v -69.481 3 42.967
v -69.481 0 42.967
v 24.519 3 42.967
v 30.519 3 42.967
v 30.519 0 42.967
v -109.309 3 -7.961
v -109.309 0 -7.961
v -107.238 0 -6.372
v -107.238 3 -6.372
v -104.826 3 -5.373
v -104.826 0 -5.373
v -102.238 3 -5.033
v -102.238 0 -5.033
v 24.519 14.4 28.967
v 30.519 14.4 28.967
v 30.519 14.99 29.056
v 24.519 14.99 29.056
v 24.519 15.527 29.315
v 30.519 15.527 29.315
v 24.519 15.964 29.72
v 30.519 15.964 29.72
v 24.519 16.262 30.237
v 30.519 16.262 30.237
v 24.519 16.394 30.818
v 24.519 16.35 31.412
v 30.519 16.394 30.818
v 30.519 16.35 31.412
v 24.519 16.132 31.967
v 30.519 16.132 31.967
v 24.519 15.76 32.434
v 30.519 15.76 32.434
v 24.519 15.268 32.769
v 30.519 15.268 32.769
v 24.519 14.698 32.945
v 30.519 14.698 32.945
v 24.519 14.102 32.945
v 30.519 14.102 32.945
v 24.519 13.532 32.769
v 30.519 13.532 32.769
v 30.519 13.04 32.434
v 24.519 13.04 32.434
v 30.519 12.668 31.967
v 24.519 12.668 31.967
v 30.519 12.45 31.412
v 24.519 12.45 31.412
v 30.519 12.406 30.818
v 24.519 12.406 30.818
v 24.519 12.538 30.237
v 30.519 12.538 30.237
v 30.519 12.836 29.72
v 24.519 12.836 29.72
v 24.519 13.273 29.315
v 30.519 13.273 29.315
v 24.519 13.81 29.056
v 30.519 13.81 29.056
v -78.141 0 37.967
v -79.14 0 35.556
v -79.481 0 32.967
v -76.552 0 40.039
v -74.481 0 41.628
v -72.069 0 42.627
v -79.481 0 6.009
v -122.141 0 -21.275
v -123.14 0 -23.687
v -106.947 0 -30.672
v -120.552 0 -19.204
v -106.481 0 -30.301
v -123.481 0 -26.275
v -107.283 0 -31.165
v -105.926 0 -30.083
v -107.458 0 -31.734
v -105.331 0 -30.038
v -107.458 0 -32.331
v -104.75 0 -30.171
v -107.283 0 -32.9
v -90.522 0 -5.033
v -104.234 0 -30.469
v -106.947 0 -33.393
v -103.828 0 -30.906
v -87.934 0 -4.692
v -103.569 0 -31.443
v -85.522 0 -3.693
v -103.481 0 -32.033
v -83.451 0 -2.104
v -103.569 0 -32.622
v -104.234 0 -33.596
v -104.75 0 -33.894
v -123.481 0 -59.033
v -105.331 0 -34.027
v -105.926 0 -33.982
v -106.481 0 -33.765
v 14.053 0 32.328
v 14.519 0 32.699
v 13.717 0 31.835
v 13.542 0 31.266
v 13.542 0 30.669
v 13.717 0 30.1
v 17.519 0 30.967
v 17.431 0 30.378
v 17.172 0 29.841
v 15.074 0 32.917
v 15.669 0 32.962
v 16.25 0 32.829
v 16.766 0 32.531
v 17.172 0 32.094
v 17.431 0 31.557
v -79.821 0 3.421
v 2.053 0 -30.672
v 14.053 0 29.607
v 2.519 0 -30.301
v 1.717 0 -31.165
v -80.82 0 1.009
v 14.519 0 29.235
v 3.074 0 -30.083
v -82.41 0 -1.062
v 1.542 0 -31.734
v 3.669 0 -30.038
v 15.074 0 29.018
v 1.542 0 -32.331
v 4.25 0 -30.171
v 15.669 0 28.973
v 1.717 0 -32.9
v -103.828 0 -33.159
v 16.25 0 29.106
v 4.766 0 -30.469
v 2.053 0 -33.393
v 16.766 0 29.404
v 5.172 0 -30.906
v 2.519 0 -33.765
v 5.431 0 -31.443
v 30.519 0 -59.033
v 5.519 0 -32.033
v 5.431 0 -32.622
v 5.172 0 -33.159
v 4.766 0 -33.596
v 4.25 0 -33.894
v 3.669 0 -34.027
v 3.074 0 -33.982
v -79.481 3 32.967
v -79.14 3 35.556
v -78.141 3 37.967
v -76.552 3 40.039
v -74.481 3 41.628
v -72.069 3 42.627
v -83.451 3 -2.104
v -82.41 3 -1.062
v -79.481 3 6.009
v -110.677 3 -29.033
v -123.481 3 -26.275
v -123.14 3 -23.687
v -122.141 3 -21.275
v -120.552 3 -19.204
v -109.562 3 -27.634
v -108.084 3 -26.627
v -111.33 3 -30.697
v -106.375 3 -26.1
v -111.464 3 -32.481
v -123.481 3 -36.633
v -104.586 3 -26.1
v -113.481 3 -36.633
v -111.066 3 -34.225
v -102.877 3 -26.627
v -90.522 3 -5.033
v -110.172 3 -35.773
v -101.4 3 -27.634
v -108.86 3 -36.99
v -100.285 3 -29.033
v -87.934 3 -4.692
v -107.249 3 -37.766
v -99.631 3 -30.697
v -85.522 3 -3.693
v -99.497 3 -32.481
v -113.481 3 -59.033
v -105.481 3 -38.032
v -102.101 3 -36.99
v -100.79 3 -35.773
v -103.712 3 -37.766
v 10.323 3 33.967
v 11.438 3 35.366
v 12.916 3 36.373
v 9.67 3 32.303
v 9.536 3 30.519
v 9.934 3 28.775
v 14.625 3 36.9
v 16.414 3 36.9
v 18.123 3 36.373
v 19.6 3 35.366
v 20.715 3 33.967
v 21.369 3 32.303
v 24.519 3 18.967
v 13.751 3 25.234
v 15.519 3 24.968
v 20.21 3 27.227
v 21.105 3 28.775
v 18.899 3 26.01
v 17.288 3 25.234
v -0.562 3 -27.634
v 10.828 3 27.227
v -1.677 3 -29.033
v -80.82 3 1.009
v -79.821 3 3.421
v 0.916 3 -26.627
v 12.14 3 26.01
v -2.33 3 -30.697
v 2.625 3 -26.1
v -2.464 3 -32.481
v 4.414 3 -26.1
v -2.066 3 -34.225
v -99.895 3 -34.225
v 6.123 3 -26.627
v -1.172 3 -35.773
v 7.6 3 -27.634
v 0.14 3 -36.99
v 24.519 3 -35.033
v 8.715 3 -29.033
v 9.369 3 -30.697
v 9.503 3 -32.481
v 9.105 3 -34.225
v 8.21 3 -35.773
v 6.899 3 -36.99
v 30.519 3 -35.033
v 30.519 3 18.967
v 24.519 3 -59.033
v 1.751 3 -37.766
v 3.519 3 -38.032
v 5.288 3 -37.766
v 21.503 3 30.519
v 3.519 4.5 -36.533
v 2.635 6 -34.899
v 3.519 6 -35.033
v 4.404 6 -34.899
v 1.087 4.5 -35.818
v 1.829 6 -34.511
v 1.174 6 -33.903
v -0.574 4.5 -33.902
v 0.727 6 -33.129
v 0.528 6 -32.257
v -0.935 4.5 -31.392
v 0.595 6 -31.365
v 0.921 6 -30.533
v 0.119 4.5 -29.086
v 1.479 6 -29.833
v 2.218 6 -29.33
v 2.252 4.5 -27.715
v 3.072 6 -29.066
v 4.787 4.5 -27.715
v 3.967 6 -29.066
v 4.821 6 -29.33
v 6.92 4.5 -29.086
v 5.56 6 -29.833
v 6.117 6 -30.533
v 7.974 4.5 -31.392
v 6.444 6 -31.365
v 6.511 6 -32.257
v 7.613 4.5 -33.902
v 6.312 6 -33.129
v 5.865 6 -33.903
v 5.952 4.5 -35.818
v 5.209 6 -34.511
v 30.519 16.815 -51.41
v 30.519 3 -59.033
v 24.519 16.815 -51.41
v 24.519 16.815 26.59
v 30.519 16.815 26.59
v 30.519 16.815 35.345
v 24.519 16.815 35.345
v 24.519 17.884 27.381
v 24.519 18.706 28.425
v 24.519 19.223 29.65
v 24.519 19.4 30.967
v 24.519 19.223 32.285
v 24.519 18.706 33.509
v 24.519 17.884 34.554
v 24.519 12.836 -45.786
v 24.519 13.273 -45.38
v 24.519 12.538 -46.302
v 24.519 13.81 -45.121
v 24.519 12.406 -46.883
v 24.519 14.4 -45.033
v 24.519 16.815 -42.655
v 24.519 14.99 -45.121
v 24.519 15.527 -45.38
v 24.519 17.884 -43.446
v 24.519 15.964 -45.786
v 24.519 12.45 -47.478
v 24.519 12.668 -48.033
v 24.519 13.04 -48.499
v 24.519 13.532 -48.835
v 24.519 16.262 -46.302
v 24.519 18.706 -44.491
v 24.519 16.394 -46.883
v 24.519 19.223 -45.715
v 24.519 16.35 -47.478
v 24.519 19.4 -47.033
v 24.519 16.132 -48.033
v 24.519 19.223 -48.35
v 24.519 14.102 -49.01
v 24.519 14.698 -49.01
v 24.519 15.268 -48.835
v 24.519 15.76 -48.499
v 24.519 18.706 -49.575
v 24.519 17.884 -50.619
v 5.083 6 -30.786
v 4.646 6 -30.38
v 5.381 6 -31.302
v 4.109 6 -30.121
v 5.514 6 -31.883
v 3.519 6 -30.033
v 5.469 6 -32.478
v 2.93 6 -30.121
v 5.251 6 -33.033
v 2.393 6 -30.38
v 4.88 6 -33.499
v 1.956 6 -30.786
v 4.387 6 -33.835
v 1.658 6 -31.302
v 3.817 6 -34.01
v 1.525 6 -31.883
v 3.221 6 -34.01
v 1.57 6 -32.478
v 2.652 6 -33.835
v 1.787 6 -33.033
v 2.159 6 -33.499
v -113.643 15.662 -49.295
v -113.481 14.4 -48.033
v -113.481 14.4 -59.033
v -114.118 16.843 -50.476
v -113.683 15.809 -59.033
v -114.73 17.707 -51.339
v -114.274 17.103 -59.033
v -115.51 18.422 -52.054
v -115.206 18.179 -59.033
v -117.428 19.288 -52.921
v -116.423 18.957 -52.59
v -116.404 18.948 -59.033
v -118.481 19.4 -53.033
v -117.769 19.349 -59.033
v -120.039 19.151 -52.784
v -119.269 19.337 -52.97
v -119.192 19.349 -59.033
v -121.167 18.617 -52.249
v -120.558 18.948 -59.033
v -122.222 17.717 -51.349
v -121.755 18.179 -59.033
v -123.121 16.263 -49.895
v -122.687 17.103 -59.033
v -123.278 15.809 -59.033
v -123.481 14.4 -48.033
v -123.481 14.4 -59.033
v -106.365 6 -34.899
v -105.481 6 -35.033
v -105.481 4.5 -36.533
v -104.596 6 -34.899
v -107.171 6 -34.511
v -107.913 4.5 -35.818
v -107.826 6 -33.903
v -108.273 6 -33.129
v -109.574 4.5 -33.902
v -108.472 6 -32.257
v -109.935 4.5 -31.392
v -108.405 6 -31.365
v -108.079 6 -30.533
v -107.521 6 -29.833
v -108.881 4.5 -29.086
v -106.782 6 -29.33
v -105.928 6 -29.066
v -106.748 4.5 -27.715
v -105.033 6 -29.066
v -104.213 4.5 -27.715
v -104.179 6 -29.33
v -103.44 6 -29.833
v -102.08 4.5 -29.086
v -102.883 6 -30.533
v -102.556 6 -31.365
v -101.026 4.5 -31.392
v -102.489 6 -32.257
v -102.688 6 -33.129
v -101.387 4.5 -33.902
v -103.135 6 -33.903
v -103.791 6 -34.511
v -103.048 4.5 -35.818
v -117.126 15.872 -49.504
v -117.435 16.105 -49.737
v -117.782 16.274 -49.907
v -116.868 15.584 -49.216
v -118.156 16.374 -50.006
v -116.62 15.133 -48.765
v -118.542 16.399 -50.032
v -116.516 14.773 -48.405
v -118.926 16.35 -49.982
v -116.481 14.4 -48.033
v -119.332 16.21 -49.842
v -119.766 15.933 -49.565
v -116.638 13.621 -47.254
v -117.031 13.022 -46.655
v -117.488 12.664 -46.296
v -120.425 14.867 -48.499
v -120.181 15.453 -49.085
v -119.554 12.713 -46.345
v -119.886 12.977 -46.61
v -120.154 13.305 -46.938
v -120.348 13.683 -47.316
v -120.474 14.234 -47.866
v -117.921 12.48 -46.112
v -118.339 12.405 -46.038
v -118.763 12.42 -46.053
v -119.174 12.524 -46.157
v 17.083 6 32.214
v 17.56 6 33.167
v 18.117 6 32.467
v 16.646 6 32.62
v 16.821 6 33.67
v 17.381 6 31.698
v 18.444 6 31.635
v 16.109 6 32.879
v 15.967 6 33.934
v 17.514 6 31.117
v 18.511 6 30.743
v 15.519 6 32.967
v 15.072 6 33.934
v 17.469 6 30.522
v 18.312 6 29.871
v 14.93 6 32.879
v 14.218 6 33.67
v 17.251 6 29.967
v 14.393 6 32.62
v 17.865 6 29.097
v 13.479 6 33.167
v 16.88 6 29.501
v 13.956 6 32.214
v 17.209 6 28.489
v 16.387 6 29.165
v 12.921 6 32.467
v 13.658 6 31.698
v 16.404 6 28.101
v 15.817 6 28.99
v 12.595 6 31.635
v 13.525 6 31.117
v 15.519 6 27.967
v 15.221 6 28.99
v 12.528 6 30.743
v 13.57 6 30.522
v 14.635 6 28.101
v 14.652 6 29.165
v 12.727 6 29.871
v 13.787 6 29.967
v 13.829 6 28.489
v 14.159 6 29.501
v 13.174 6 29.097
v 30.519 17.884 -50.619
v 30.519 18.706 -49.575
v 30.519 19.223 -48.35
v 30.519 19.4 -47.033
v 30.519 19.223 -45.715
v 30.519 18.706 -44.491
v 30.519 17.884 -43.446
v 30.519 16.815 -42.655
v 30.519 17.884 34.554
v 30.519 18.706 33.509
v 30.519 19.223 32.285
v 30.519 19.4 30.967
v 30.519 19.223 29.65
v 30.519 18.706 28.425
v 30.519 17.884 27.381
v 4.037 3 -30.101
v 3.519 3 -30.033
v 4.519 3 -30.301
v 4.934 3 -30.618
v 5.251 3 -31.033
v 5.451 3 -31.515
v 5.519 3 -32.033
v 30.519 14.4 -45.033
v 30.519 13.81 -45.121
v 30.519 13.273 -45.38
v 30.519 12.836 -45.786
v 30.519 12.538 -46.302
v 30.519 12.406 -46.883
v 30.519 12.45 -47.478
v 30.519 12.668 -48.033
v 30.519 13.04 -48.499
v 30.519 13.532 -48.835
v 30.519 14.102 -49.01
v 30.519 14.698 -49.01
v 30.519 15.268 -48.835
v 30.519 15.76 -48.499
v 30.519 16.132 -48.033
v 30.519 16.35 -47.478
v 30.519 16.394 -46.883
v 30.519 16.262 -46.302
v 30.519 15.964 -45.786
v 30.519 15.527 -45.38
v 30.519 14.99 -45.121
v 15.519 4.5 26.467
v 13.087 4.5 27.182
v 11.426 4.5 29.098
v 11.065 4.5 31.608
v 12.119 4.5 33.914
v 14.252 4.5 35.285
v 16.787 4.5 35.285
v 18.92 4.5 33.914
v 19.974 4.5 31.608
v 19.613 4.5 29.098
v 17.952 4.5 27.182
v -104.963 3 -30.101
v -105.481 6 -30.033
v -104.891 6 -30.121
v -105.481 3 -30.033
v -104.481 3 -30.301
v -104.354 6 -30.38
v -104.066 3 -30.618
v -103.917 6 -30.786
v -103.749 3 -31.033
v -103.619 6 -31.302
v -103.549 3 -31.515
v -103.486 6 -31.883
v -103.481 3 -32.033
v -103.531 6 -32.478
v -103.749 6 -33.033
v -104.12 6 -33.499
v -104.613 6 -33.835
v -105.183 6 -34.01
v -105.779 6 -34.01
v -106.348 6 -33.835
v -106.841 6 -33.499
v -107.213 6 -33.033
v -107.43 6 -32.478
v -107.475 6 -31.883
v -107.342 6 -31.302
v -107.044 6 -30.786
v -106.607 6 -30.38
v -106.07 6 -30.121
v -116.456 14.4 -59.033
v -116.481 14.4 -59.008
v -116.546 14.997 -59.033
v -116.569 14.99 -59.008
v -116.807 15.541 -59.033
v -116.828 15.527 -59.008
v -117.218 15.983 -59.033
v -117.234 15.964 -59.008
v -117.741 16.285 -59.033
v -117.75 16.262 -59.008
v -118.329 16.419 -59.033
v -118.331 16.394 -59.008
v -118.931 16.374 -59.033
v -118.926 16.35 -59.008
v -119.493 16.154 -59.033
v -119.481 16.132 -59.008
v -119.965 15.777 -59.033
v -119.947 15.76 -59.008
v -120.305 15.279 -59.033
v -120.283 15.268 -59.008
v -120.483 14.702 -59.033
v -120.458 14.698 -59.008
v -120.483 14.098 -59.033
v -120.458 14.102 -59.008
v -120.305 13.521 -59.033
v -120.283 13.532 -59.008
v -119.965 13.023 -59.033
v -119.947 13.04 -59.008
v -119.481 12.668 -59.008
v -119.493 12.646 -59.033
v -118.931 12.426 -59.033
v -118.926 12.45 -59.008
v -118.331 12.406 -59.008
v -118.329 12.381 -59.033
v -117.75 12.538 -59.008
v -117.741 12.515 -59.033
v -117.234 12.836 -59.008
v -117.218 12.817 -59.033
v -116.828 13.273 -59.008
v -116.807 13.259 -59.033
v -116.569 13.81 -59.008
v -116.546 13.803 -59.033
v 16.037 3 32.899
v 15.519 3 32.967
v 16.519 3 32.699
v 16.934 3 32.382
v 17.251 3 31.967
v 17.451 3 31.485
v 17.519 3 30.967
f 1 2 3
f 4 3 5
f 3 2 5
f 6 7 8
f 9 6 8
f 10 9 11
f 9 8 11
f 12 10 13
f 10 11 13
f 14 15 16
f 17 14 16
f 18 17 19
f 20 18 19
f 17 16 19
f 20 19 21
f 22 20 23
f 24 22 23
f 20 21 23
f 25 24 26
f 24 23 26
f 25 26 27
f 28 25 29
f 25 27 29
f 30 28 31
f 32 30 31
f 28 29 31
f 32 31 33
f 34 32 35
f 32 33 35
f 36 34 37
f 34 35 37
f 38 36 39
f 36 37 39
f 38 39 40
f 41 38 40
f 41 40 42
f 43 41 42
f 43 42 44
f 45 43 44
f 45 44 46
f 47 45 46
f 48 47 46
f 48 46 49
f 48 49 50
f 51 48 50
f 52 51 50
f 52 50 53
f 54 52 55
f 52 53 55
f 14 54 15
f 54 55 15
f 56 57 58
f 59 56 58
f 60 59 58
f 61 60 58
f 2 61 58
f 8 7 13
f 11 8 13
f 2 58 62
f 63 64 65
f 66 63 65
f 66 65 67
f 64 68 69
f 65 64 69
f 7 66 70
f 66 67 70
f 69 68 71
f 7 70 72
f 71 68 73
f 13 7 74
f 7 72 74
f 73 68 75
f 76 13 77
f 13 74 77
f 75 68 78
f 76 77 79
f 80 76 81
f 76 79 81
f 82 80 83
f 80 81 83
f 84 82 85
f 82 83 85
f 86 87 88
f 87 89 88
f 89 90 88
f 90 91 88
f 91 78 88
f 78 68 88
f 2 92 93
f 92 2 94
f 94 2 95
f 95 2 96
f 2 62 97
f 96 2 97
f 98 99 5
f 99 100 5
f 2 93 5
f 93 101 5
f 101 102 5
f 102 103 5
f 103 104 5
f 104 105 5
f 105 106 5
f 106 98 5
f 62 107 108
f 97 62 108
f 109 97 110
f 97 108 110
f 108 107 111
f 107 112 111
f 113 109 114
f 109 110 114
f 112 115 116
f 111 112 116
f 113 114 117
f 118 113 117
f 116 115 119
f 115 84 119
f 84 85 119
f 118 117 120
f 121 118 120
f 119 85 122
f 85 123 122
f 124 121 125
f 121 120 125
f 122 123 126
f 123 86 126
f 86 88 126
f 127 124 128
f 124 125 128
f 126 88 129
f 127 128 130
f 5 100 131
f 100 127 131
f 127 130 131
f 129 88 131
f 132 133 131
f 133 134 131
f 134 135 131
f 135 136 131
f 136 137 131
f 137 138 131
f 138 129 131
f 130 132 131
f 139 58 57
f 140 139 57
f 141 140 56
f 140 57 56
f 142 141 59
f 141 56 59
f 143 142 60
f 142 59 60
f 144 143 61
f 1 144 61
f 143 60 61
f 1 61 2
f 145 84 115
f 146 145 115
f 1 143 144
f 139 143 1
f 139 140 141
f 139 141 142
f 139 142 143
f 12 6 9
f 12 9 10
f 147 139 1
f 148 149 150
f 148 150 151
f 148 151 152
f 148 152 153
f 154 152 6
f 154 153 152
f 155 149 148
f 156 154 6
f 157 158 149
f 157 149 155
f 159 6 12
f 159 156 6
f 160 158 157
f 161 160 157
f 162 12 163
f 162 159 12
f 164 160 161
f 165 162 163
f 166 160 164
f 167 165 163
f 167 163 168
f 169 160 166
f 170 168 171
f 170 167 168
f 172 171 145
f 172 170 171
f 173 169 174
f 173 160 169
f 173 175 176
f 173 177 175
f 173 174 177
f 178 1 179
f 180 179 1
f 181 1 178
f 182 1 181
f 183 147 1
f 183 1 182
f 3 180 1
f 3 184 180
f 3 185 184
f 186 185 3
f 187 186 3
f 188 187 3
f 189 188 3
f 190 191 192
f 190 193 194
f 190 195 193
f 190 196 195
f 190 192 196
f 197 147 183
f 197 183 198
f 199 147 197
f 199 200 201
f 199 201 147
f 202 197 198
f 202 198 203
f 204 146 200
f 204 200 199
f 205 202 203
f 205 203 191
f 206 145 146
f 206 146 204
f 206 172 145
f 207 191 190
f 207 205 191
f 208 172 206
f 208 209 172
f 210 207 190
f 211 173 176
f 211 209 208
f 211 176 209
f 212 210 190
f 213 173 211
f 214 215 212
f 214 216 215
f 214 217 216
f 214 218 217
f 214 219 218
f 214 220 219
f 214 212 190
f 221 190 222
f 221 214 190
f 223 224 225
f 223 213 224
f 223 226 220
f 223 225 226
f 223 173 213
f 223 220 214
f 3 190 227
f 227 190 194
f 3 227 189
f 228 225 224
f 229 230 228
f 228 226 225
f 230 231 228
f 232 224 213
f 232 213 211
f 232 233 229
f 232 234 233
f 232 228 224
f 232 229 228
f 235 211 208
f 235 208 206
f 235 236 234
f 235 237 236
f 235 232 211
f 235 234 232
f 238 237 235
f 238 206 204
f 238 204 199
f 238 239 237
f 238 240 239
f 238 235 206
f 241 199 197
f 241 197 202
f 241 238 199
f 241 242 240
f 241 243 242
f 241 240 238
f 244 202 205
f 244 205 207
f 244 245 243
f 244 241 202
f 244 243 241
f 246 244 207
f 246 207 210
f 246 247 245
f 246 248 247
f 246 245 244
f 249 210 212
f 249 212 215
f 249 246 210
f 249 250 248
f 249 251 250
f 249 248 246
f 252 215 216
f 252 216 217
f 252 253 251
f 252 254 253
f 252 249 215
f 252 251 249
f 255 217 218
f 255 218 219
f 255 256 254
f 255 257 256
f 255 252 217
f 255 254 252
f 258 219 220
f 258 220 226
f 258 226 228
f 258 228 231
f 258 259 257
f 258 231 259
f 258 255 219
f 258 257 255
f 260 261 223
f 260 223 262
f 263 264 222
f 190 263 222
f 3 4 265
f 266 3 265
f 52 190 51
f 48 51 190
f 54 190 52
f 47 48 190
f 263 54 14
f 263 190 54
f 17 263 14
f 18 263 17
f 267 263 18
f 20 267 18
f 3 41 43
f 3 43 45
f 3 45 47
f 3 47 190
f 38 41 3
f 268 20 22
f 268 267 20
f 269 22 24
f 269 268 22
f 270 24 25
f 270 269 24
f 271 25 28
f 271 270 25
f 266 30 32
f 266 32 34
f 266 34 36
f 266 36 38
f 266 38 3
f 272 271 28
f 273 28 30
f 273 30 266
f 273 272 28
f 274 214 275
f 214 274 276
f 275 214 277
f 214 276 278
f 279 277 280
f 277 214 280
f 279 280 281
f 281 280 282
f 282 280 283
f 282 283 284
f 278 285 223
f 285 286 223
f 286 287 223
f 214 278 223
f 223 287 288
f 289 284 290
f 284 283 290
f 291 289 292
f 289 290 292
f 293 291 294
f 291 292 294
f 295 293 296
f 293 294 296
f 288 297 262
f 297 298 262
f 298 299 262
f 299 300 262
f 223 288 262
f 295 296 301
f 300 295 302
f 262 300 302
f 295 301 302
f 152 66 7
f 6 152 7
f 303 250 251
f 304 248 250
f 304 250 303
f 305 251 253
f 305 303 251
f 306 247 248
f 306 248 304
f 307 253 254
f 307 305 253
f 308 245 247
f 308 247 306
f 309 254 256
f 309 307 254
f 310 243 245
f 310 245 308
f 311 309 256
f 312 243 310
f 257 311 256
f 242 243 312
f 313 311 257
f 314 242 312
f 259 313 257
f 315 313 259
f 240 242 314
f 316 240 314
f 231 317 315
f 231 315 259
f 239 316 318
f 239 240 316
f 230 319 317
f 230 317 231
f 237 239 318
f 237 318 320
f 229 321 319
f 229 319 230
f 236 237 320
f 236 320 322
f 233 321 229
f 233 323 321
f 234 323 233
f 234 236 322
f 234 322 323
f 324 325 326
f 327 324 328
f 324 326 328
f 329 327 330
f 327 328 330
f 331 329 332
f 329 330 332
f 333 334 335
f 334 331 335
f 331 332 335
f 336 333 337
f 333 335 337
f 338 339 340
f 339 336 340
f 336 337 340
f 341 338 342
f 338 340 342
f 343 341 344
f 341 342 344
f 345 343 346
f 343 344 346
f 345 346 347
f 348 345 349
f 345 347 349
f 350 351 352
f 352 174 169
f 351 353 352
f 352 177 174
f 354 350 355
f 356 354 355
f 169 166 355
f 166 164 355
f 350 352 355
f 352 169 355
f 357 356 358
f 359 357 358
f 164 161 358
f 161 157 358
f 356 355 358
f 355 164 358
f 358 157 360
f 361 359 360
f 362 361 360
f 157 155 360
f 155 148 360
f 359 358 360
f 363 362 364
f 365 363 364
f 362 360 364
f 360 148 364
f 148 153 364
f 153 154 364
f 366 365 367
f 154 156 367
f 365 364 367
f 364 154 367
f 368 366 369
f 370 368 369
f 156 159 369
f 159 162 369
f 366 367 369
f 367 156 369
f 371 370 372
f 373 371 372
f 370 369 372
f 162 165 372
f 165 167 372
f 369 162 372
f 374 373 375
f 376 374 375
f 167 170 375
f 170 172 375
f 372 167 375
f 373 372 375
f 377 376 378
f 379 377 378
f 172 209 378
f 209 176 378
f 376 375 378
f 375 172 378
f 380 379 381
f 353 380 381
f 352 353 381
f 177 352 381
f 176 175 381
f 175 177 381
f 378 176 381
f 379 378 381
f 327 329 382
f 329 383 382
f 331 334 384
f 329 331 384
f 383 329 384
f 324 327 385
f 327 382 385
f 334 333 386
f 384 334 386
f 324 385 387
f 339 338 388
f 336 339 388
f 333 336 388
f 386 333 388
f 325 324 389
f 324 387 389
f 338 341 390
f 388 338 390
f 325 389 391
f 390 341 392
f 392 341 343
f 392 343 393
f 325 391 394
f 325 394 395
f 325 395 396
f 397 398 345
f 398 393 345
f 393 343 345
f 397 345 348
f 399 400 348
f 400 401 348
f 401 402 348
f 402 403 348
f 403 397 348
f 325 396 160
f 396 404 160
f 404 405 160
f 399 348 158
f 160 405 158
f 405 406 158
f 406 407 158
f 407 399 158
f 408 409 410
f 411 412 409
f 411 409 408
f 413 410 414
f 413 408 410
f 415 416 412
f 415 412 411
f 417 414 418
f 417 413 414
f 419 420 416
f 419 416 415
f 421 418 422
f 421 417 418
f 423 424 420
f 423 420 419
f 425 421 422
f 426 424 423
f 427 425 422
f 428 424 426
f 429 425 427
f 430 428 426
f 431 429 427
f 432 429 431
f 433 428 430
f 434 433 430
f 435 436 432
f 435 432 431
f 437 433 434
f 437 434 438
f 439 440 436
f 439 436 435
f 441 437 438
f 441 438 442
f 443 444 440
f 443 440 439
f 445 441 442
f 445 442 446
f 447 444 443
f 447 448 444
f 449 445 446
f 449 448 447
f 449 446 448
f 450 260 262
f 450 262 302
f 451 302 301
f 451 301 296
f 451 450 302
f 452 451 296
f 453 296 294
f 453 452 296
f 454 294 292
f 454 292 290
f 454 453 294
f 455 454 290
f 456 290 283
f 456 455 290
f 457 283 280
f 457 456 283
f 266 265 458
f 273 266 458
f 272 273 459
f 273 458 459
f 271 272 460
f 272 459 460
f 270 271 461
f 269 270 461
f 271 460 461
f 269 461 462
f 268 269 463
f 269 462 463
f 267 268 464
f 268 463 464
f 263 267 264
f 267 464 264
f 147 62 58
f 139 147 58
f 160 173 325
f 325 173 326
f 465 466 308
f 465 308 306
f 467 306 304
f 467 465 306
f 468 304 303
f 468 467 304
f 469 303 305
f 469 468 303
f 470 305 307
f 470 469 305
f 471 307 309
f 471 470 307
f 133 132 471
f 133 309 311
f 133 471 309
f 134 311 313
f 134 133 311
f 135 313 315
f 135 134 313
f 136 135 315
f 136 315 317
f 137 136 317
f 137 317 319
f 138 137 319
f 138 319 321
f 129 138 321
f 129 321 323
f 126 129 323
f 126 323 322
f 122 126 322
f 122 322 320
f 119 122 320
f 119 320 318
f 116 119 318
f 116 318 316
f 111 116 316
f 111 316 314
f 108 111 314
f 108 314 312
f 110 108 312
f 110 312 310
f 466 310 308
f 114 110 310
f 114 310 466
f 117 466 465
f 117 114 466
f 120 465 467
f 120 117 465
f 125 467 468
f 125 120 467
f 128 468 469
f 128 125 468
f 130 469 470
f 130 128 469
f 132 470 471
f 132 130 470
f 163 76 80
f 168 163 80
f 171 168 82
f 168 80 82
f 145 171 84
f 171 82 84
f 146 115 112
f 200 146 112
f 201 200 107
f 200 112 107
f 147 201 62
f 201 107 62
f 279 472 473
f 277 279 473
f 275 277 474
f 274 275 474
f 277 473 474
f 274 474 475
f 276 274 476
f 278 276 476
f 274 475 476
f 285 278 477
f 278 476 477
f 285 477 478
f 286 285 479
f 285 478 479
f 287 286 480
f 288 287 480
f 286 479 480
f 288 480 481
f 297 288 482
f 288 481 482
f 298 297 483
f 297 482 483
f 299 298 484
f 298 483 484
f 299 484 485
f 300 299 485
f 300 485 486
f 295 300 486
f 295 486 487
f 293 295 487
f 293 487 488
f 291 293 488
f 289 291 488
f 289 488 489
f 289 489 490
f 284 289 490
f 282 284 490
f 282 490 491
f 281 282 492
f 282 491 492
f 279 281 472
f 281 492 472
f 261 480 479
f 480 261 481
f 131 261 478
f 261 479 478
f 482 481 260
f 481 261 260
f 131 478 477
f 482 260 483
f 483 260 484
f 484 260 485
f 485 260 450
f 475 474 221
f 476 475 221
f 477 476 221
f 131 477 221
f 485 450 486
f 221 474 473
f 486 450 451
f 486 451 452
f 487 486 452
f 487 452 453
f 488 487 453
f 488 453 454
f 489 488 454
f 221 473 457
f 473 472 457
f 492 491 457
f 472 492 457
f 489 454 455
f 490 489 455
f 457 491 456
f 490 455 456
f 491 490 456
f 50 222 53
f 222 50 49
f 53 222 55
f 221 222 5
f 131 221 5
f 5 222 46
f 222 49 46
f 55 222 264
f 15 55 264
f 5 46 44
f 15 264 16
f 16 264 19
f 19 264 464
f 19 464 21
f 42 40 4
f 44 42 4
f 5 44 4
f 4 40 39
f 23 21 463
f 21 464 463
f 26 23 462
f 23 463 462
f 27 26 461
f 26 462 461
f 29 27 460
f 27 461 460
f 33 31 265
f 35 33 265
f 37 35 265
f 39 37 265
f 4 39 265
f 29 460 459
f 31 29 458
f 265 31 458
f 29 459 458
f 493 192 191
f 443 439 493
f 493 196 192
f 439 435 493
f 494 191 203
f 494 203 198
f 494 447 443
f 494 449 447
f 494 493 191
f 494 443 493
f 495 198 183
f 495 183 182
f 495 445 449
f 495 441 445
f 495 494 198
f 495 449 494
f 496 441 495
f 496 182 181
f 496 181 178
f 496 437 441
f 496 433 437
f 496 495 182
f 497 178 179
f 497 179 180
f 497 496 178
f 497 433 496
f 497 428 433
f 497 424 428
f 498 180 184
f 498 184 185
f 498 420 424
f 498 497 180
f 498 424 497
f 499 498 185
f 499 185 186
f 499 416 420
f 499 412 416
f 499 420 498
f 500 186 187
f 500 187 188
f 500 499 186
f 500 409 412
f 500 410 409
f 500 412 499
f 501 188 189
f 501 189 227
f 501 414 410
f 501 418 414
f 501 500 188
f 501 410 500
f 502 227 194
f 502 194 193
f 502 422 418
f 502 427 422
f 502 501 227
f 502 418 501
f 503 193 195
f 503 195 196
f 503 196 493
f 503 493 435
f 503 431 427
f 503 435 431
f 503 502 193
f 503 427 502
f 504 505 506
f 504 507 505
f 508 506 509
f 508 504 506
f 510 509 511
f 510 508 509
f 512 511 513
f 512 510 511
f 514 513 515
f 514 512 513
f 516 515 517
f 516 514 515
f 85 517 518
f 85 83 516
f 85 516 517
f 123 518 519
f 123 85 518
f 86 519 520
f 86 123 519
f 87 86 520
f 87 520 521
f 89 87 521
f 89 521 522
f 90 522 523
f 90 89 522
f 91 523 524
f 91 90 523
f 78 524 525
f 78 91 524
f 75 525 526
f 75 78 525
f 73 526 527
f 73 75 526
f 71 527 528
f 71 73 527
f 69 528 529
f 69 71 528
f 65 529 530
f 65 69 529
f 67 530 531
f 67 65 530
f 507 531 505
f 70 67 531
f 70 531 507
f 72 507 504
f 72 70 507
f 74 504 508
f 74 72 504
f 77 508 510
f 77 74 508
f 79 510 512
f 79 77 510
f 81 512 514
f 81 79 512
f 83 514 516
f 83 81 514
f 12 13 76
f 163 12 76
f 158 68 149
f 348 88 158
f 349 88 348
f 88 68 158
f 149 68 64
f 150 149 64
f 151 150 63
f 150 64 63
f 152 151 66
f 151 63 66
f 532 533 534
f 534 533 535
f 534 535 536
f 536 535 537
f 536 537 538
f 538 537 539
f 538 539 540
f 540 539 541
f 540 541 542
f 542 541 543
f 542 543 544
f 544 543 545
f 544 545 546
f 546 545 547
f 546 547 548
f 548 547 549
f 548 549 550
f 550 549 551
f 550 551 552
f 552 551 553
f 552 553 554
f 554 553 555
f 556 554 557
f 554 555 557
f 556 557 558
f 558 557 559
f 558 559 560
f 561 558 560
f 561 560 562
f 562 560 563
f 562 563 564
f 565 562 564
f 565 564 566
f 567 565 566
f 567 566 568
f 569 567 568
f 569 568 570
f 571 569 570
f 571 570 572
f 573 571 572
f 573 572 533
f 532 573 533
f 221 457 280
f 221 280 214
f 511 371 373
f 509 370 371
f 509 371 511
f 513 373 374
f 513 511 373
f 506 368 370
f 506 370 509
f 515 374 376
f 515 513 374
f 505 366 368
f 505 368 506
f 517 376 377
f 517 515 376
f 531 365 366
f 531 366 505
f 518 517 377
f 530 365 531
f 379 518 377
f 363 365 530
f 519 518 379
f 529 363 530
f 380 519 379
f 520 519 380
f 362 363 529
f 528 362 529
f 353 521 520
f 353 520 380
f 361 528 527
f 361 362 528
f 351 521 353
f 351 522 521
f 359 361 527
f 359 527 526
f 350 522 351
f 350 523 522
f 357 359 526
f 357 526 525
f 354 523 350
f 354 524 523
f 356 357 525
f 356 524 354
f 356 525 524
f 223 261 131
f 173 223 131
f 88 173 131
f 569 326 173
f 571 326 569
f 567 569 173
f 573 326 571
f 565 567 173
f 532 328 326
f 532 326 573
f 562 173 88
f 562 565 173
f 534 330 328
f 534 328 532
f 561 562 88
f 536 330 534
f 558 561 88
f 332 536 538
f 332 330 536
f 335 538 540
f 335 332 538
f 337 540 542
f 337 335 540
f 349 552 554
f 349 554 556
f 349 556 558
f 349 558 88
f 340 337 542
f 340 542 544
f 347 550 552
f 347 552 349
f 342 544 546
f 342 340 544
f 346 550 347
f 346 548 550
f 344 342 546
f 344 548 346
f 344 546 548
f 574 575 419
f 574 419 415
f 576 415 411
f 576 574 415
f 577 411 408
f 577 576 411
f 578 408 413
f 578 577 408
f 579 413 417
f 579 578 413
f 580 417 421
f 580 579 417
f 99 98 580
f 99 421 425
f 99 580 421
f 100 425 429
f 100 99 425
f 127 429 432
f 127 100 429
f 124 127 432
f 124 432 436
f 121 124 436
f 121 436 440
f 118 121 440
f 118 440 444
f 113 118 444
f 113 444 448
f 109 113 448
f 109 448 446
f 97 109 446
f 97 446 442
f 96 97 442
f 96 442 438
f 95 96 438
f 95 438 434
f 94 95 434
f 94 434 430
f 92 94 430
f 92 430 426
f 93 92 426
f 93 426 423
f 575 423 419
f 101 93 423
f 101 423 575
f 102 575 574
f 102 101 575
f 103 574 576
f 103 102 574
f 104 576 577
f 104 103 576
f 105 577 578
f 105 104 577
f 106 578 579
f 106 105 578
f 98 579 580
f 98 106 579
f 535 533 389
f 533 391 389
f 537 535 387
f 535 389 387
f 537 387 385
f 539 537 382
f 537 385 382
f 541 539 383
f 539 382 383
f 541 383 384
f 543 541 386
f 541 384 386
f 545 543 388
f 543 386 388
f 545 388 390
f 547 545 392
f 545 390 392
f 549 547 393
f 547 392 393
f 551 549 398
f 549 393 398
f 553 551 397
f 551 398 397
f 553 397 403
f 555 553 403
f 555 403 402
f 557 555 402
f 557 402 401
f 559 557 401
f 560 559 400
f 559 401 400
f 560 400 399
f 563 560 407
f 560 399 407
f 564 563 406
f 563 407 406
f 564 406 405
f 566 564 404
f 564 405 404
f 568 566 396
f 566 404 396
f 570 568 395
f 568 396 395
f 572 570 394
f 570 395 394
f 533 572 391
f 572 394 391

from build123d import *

# Parameters (mm, degrees)
SKETCH1_R                       = 2
BOSS_EXTRUDE1_DEPTH             = 3
SKETCH4_R                       = 3
SKETCH4_R_2                     = 2
BOSS_EXTRUDE2_DEPTH             = 3
CHAMFER1_SIZE                   = 3
BOSS_EXTRUDE3_DEPTH             = 4
BOSS_EXTRUDE4_DEPTH             = 20
CUT_EXTRUDE1_REACH              = 168.064
F_4_0MM_DOWEL_HOLE1_D           = 4
F_4_0MM_DOWEL_HOLE1_CSINK_D     = 4.05
F_4_0MM_DOWEL_HOLE1_CSINK_ANGLE = 90
SKETCH13_R                      = 2
BOSS_EXTRUDE5_DEPTH             = 6


with BuildPart() as part:
    # Sketch1 → Boss-Extrude1 (new body)
    with BuildSketch(Plane(origin=(0, 0, 0), x_dir=(1, 0, 0), z_dir=(0, 1, 0))):
        with BuildLine():
            ThreePointArc((-123.480593783, 26.275205138), (-122.719389108, 22.448370814), (-120.551661595, 19.204137326))
            Line((-120.551661595, 19.204137326), (-109.309020908, 7.961496639))
            ThreePointArc((-109.309020908, 7.961496639), (-106.064787419, 5.793769125), (-102.237953096, 5.032564451))
            Line((-102.237953096, 5.032564451), (-90.522224343, 5.032564451))
            ThreePointArc((-90.522224343, 5.032564451), (-86.69539002, 4.271359776), (-83.451156531, 2.103632262))
            Line((-83.451156531, 2.103632262), (-82.409525971, 1.062001702))
            ThreePointArc((-82.409525971, 1.062001702), (-80.241798458, -2.182231786), (-79.480593783, -6.00906611))
            Line((-79.480593783, -6.00906611), (-79.480593783, -32.967435549))
            ThreePointArc((-79.480593783, -32.967435549), (-76.551661595, -40.038503361), (-69.480593783, -42.967435549))
            Line((-69.480593783, -42.967435549), (30.519406217, -42.967435549))
            Line((30.519406217, -42.967435549), (30.519406217, 59.032564451))
            Line((30.519406217, 59.032564451), (-123.480593783, 59.032564451))
            Line((-123.480593783, 59.032564451), (-123.480593783, 26.275205138))
        make_face()
        with Locations((-105.480593783, 32.032564451)):
            Circle(SKETCH1_R, mode=Mode.SUBTRACT)
        with Locations((3.519406217, 32.032564451)):
            Circle(SKETCH1_R, mode=Mode.SUBTRACT)
        with Locations((15.519406217, -30.967435549)):
            Circle(SKETCH1_R, mode=Mode.SUBTRACT)
    extrude(amount=BOSS_EXTRUDE1_DEPTH)

    # Sketch4 → Boss-Extrude2 (add)
    # profile 1 of 3: a face of its own
    with BuildSketch(Plane(origin=(0, 3, 0), x_dir=(1, 0, 0), z_dir=(0, 1, 0))):
        with Locations(Location((-105.480593783, 32.032564451, 0), (0, 0, 90))):
            Circle(SKETCH4_R)
        with Locations(Location((-105.480593783, 32.032564451, 0), (0, 0, 270))):
            Circle(SKETCH4_R_2, mode=Mode.SUBTRACT)
    # profile 2 of 3: a face of its own
    with BuildSketch(Plane(origin=(0, 3, 0), x_dir=(1, 0, 0), z_dir=(0, 1, 0))):
        with Locations(Location((15.519406217, -30.967435549, 0), (0, 0, 90))):
            Circle(SKETCH4_R)
        with Locations(Location((15.519406217, -30.967435549, 0), (0, 0, 270))):
            Circle(SKETCH4_R_2, mode=Mode.SUBTRACT)
    # profile 3 of 3: a face of its own
    with BuildSketch(Plane(origin=(0, 3, 0), x_dir=(1, 0, 0), z_dir=(0, 1, 0))):
        with Locations(Location((3.519406217, 32.032564451, 0), (0, 0, 90))):
            Circle(SKETCH4_R)
        with Locations(Location((3.519406217, 32.032564451, 0), (0, 0, 270))):
            Circle(SKETCH4_R_2, mode=Mode.SUBTRACT)
    extrude(amount=BOSS_EXTRUDE2_DEPTH)

    # Chamfer1
    chamfer1_edges = [part.edges().sort_by_distance(p)[0] for p in [
        (-105.480593783, 3, -29.032564451),
        (15.519406217, 3, 33.967435549),
        (3.519406217, 3, -29.032564451),
    ]]
    chamfer(chamfer1_edges, length=CHAMFER1_SIZE - 0.0001)  # a hair under: the kernel refuses the full size

    # Sketch7 → Boss-Extrude3 (add)
    with BuildSketch(Plane(origin=(0, 0, -59.032564451), x_dir=(-1, 0, 0), z_dir=(0, 0, -1))):
        with BuildLine():
            Line((113.480593783, 14.4), (113.480593783, 3))
            Line((113.480593783, 3), (123.480593783, 3))
            Line((123.480593783, 3), (123.480593783, 14.4))
            ThreePointArc((123.480593783, 14.4), (118.480593783, 19.4), (113.480593783, 14.4))
        make_face()
    extrude(amount=-BOSS_EXTRUDE3_DEPTH)

    # Sketch9 → Boss-Extrude4 (add)
    with BuildSketch(Plane.XY.offset(-55.032564451)):
        with BuildLine():
            Line((-123.480593783, 3), (-113.480593783, 3))
            Line((-113.480593783, 3), (-113.480593783, 14.4))
            ThreePointArc((-113.480593783, 14.4), (-118.480593783, 19.4), (-123.480593783, 14.4))
            Line((-123.480593783, 14.4), (-123.480593783, 3))
        make_face()
    extrude(amount=BOSS_EXTRUDE4_DEPTH)

    # Sketch10 → Cut-Extrude1 (cut, up to next)
    with BuildSketch(Plane.ZY.offset(123.480593783), mode=Mode.PRIVATE) as cut_extrude1_sk1:
        Polygon((-53.032564451, 19.4), (-36.632564451, 3), (-35.032564451, 3), (-35.032564451, 19.4), align=None)
    cut_extrude1_tool1 = extrude(cut_extrude1_sk1.sketch, amount=-CUT_EXTRUDE1_REACH, mode=Mode.PRIVATE) & part.part
    add(cut_extrude1_tool1.solids().sort_by_distance((-123.480594, 13.487075, -41.076102))[0], mode=Mode.SUBTRACT)

    # Ø4.0mm Dowel Hole1 (through all)
    with Locations(Plane(origin=(0, 0, -59.032564451), x_dir=(-1, 0, 0), z_dir=(0, 0, -1))):
        with Locations((118.480593783, 14.4)):
            CounterSinkHole(F_4_0MM_DOWEL_HOLE1_D / 2, F_4_0MM_DOWEL_HOLE1_CSINK_D / 2, counter_sink_angle=F_4_0MM_DOWEL_HOLE1_CSINK_ANGLE)

    # Sketch13 → Boss-Extrude5 (add)
    # profile 1 of 2: a face of its own
    with BuildSketch(Plane(origin=(30.519406217, 0, 0), x_dir=(0, 0, -1), z_dir=(1, 0, 0))):
        with BuildLine():
            Line((-26.589524244, 16.815345234), (-18.967435549, 3))
            Line((-18.967435549, 3), (-42.967435549, 3))
            Line((-42.967435549, 3), (-35.345346855, 16.815345234))
            ThreePointArc((-35.345346855, 16.815345234), (-30.967435549, 19.4), (-26.589524244, 16.815345234))
        make_face()
        with Locations((-30.967435549, 14.4)):
            Circle(SKETCH13_R, mode=Mode.SUBTRACT)
    # profile 2 of 2: a face of its own
    with BuildSketch(Plane(origin=(30.519406217, 0, 0), x_dir=(0, 0, -1), z_dir=(1, 0, 0))):
        with BuildLine():
            Line((59.032564451, 3), (51.410475756, 16.815345234))
            ThreePointArc((51.410475756, 16.815345234), (47.032564451, 19.4), (42.654653145, 16.815345234))
            Line((42.654653145, 16.815345234), (35.032564451, 3))
            Line((35.032564451, 3), (59.032564451, 3))
        make_face()
        with Locations(Location((47.032564451, 14.4, 0), (0, 0, 180))):
            Circle(SKETCH13_R, mode=Mode.SUBTRACT)
    extrude(amount=-BOSS_EXTRUDE5_DEPTH)


solid = part.part
